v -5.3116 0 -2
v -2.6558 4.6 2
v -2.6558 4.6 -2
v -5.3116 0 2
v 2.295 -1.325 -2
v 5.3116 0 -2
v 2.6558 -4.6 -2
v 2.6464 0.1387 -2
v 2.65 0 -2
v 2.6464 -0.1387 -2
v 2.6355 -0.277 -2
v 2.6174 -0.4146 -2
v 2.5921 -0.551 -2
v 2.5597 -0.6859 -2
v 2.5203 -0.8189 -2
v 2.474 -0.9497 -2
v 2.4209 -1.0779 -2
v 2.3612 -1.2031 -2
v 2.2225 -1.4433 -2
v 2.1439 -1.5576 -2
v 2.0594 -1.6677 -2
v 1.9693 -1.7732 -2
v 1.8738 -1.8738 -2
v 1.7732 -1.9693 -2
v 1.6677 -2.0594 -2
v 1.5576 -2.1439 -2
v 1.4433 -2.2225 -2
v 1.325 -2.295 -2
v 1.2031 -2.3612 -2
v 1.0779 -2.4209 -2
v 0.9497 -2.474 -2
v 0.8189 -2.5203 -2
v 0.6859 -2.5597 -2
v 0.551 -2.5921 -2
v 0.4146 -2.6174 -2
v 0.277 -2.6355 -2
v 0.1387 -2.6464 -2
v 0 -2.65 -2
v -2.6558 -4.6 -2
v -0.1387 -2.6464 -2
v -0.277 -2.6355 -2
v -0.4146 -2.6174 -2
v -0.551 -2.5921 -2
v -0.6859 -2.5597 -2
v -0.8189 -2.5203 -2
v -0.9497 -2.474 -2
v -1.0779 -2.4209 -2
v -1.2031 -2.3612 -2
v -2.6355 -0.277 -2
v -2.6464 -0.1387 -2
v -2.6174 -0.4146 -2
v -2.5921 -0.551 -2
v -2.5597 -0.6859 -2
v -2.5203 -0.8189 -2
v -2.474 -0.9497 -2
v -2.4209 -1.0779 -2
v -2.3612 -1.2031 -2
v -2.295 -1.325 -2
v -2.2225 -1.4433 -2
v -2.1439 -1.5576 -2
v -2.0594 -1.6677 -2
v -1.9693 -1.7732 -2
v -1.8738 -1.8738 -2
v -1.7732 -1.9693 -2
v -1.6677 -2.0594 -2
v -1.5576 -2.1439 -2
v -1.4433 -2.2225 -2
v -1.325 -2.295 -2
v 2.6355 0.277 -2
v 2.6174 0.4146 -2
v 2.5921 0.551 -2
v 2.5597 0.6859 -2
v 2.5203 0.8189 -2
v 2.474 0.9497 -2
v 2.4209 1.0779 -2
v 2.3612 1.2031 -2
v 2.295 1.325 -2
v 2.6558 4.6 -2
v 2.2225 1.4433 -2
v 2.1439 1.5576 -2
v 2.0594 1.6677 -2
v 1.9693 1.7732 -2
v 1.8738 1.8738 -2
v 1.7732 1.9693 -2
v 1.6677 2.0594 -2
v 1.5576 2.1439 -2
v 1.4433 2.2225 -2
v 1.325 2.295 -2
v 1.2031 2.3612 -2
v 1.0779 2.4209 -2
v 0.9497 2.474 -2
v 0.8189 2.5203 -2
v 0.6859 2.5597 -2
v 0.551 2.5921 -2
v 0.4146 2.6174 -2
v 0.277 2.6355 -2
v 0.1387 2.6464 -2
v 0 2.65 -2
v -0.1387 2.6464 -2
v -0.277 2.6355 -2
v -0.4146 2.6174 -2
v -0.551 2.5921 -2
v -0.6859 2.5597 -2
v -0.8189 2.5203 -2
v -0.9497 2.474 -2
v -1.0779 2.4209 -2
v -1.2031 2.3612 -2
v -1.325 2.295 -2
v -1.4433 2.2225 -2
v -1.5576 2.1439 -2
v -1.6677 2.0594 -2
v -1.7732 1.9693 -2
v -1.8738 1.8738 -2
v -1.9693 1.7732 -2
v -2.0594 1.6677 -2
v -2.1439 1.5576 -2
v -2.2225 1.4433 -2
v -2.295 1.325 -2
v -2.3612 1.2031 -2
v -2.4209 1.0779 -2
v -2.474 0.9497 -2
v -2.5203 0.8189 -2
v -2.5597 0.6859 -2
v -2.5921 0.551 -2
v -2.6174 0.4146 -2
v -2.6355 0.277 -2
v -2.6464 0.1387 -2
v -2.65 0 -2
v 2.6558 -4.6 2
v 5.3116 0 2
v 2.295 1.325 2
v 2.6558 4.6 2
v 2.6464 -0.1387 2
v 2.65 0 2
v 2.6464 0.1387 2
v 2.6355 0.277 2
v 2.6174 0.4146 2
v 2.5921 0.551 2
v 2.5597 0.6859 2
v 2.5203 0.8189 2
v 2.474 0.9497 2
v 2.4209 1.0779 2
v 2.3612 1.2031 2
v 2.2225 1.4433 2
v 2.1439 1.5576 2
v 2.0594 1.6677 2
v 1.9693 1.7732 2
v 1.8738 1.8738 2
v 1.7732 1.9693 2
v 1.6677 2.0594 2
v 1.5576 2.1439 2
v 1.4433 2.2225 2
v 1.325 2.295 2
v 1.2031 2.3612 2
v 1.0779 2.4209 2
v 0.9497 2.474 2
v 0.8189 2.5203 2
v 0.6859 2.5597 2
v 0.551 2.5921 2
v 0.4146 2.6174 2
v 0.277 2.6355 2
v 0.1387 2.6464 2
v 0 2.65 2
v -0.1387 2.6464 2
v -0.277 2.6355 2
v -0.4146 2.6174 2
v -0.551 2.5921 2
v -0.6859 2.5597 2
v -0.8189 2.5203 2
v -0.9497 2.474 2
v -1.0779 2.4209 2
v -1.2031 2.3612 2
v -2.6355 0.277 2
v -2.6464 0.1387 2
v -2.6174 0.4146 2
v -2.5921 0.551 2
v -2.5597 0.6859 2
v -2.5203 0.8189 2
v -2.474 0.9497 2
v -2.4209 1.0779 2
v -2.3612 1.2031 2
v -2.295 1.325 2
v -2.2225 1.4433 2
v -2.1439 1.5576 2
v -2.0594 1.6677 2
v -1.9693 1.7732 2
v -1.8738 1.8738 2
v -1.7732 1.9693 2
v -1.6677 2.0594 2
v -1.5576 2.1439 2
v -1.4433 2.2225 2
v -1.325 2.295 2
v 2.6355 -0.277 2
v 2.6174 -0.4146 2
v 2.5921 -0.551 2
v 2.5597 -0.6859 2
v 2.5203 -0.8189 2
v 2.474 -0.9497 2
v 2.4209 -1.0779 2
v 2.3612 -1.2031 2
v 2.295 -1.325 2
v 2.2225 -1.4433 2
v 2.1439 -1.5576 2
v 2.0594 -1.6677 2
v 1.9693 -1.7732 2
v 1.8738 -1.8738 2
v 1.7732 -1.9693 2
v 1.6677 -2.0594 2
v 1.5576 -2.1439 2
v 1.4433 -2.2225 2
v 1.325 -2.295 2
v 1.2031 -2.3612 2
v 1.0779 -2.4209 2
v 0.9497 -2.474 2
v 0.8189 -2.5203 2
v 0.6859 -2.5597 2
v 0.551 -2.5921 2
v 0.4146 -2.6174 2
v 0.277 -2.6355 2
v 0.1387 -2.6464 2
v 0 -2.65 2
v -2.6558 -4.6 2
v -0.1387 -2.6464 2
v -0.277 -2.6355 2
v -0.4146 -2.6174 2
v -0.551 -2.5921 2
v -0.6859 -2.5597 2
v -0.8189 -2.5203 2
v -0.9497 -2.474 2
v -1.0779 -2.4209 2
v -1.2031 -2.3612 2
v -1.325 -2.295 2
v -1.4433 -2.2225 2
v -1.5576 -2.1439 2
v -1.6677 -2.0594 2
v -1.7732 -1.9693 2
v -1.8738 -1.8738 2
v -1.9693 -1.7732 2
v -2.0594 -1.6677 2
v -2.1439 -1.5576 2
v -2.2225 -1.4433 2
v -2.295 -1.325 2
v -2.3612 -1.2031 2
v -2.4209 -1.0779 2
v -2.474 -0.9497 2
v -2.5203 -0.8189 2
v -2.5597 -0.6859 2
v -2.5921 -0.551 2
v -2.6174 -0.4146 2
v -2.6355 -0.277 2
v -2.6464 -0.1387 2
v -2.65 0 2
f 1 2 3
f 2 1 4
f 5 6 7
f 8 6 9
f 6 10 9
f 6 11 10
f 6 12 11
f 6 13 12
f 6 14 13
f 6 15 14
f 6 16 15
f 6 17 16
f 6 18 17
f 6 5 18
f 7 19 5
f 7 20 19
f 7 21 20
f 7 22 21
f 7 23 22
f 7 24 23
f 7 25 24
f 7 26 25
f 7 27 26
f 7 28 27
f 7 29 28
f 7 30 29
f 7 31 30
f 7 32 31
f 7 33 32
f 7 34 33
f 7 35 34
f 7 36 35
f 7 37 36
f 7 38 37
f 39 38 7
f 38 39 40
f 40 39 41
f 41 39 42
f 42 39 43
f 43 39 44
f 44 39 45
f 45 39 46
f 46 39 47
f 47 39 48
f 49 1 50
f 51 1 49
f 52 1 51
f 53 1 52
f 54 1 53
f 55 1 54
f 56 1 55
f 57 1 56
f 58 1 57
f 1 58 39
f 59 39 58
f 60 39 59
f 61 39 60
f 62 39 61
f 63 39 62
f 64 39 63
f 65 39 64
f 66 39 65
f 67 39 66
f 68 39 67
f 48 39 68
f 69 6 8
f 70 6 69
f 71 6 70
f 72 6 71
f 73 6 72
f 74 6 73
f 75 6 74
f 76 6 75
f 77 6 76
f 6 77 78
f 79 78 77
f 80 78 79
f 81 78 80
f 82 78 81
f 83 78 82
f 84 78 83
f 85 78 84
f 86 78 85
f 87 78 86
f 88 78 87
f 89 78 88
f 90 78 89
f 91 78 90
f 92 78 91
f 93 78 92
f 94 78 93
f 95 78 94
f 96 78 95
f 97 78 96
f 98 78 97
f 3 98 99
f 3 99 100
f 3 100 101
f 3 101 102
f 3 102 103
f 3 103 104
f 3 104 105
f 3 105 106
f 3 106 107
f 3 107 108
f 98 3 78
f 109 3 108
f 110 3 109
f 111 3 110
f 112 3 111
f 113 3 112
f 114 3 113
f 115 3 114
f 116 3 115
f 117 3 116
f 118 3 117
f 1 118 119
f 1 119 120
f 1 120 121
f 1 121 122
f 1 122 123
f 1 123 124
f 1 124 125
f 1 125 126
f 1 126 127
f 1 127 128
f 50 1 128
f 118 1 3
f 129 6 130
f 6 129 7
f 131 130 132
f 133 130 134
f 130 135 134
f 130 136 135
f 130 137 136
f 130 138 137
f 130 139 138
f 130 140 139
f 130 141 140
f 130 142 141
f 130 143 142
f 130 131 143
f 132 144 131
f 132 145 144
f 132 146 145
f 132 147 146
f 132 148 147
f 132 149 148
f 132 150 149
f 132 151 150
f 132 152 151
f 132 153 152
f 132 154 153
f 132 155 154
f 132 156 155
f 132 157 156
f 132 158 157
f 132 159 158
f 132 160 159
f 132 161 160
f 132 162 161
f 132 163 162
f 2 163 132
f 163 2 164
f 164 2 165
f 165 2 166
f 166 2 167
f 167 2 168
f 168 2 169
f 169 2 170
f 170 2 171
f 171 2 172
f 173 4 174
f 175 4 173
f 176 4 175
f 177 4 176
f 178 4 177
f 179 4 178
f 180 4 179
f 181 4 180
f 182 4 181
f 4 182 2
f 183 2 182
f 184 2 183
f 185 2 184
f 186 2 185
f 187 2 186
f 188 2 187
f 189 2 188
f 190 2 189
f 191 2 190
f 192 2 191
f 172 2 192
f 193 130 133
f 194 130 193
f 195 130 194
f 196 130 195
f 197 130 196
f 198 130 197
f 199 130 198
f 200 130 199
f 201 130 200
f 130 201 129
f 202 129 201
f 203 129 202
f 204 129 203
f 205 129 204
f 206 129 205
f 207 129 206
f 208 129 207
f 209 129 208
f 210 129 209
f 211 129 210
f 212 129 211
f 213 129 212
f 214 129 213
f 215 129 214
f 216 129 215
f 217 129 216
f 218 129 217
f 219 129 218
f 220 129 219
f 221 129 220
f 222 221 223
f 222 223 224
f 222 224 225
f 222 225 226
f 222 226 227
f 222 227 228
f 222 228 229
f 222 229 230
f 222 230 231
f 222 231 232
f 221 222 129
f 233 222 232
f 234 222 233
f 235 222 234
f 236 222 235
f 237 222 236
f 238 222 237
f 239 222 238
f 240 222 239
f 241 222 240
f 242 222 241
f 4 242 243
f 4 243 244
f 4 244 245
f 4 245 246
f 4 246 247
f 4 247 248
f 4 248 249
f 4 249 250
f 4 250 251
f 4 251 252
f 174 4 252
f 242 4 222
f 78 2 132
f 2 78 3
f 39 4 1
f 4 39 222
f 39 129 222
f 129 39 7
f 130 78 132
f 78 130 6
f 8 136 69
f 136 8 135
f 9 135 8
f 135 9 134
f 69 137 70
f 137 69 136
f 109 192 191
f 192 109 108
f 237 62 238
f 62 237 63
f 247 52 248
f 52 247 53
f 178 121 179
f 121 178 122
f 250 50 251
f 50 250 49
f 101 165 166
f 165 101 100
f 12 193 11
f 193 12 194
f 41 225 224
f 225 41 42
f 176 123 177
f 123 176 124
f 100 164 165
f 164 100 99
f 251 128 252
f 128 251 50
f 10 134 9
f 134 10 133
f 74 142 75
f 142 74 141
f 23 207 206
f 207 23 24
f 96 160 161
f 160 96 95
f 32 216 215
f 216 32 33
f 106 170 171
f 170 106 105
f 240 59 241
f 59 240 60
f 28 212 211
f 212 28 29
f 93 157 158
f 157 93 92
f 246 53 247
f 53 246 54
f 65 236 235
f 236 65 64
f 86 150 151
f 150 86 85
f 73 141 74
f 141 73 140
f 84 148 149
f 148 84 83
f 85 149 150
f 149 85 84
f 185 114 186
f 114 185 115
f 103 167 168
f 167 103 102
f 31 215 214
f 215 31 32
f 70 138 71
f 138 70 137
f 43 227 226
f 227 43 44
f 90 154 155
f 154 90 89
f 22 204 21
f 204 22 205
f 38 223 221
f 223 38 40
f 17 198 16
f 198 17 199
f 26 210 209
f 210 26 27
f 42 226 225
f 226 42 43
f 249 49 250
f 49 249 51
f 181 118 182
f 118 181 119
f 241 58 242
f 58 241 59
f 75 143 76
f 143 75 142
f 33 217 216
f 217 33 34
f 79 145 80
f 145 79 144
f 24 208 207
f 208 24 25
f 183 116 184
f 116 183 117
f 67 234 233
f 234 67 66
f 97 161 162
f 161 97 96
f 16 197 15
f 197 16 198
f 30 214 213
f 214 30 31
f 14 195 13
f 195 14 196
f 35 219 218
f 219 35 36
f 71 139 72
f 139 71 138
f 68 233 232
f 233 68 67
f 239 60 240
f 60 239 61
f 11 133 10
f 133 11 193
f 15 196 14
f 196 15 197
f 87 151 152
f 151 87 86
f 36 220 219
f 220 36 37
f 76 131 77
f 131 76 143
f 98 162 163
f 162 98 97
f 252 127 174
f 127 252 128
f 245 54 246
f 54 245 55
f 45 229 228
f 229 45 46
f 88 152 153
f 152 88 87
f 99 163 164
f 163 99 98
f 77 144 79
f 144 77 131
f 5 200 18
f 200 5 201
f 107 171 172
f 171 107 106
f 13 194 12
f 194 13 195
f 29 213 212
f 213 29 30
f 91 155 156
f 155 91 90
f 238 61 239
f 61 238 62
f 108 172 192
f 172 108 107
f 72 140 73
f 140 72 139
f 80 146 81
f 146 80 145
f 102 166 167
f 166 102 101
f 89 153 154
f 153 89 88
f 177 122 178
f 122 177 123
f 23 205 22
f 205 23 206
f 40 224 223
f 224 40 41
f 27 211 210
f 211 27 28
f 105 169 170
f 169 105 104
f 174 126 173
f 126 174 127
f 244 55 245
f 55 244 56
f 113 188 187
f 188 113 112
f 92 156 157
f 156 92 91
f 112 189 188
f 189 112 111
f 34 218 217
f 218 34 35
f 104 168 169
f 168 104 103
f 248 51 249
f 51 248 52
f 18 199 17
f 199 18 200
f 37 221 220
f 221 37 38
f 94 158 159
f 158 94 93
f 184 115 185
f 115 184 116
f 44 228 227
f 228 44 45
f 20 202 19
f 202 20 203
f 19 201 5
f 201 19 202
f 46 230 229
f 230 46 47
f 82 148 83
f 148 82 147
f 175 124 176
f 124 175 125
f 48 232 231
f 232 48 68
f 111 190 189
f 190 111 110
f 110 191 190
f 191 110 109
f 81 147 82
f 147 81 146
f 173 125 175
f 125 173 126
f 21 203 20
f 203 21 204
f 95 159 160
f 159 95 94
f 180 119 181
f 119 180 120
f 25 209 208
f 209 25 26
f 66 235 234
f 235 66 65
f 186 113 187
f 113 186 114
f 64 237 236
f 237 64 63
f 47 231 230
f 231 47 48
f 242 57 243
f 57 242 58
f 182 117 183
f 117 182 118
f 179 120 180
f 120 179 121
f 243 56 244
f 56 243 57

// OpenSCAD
$fn = 120;

screw_d      = 5.0;   // mm (nominal screw size)
across_flats = 9.2;   // mm
thickness    = 4.0;   // mm

// Clearance hole for 5.0mm screw (adjust as desired)
hole_d = 5.3;         // mm

module hex_prism_af(af, h, center=false) {
    // Regular hex: across_flats = sqrt(3) * R (circumradius)
    R = af / sqrt(3);
    linear_extrude(height=h, center=center, convexity=10)
        polygon(points=[for (i=[0:5]) [R*cos(60*i), R*sin(60*i)]]);
}

difference() {
    // Centered so the through-hole subtraction is symmetric and always visible
    hex_prism_af(across_flats, thickness, center=true);

    // Through-hole: extend beyond both faces to guarantee a clean cut
    cylinder(d=hole_d, h=thickness + 0.4, center=true);
}
